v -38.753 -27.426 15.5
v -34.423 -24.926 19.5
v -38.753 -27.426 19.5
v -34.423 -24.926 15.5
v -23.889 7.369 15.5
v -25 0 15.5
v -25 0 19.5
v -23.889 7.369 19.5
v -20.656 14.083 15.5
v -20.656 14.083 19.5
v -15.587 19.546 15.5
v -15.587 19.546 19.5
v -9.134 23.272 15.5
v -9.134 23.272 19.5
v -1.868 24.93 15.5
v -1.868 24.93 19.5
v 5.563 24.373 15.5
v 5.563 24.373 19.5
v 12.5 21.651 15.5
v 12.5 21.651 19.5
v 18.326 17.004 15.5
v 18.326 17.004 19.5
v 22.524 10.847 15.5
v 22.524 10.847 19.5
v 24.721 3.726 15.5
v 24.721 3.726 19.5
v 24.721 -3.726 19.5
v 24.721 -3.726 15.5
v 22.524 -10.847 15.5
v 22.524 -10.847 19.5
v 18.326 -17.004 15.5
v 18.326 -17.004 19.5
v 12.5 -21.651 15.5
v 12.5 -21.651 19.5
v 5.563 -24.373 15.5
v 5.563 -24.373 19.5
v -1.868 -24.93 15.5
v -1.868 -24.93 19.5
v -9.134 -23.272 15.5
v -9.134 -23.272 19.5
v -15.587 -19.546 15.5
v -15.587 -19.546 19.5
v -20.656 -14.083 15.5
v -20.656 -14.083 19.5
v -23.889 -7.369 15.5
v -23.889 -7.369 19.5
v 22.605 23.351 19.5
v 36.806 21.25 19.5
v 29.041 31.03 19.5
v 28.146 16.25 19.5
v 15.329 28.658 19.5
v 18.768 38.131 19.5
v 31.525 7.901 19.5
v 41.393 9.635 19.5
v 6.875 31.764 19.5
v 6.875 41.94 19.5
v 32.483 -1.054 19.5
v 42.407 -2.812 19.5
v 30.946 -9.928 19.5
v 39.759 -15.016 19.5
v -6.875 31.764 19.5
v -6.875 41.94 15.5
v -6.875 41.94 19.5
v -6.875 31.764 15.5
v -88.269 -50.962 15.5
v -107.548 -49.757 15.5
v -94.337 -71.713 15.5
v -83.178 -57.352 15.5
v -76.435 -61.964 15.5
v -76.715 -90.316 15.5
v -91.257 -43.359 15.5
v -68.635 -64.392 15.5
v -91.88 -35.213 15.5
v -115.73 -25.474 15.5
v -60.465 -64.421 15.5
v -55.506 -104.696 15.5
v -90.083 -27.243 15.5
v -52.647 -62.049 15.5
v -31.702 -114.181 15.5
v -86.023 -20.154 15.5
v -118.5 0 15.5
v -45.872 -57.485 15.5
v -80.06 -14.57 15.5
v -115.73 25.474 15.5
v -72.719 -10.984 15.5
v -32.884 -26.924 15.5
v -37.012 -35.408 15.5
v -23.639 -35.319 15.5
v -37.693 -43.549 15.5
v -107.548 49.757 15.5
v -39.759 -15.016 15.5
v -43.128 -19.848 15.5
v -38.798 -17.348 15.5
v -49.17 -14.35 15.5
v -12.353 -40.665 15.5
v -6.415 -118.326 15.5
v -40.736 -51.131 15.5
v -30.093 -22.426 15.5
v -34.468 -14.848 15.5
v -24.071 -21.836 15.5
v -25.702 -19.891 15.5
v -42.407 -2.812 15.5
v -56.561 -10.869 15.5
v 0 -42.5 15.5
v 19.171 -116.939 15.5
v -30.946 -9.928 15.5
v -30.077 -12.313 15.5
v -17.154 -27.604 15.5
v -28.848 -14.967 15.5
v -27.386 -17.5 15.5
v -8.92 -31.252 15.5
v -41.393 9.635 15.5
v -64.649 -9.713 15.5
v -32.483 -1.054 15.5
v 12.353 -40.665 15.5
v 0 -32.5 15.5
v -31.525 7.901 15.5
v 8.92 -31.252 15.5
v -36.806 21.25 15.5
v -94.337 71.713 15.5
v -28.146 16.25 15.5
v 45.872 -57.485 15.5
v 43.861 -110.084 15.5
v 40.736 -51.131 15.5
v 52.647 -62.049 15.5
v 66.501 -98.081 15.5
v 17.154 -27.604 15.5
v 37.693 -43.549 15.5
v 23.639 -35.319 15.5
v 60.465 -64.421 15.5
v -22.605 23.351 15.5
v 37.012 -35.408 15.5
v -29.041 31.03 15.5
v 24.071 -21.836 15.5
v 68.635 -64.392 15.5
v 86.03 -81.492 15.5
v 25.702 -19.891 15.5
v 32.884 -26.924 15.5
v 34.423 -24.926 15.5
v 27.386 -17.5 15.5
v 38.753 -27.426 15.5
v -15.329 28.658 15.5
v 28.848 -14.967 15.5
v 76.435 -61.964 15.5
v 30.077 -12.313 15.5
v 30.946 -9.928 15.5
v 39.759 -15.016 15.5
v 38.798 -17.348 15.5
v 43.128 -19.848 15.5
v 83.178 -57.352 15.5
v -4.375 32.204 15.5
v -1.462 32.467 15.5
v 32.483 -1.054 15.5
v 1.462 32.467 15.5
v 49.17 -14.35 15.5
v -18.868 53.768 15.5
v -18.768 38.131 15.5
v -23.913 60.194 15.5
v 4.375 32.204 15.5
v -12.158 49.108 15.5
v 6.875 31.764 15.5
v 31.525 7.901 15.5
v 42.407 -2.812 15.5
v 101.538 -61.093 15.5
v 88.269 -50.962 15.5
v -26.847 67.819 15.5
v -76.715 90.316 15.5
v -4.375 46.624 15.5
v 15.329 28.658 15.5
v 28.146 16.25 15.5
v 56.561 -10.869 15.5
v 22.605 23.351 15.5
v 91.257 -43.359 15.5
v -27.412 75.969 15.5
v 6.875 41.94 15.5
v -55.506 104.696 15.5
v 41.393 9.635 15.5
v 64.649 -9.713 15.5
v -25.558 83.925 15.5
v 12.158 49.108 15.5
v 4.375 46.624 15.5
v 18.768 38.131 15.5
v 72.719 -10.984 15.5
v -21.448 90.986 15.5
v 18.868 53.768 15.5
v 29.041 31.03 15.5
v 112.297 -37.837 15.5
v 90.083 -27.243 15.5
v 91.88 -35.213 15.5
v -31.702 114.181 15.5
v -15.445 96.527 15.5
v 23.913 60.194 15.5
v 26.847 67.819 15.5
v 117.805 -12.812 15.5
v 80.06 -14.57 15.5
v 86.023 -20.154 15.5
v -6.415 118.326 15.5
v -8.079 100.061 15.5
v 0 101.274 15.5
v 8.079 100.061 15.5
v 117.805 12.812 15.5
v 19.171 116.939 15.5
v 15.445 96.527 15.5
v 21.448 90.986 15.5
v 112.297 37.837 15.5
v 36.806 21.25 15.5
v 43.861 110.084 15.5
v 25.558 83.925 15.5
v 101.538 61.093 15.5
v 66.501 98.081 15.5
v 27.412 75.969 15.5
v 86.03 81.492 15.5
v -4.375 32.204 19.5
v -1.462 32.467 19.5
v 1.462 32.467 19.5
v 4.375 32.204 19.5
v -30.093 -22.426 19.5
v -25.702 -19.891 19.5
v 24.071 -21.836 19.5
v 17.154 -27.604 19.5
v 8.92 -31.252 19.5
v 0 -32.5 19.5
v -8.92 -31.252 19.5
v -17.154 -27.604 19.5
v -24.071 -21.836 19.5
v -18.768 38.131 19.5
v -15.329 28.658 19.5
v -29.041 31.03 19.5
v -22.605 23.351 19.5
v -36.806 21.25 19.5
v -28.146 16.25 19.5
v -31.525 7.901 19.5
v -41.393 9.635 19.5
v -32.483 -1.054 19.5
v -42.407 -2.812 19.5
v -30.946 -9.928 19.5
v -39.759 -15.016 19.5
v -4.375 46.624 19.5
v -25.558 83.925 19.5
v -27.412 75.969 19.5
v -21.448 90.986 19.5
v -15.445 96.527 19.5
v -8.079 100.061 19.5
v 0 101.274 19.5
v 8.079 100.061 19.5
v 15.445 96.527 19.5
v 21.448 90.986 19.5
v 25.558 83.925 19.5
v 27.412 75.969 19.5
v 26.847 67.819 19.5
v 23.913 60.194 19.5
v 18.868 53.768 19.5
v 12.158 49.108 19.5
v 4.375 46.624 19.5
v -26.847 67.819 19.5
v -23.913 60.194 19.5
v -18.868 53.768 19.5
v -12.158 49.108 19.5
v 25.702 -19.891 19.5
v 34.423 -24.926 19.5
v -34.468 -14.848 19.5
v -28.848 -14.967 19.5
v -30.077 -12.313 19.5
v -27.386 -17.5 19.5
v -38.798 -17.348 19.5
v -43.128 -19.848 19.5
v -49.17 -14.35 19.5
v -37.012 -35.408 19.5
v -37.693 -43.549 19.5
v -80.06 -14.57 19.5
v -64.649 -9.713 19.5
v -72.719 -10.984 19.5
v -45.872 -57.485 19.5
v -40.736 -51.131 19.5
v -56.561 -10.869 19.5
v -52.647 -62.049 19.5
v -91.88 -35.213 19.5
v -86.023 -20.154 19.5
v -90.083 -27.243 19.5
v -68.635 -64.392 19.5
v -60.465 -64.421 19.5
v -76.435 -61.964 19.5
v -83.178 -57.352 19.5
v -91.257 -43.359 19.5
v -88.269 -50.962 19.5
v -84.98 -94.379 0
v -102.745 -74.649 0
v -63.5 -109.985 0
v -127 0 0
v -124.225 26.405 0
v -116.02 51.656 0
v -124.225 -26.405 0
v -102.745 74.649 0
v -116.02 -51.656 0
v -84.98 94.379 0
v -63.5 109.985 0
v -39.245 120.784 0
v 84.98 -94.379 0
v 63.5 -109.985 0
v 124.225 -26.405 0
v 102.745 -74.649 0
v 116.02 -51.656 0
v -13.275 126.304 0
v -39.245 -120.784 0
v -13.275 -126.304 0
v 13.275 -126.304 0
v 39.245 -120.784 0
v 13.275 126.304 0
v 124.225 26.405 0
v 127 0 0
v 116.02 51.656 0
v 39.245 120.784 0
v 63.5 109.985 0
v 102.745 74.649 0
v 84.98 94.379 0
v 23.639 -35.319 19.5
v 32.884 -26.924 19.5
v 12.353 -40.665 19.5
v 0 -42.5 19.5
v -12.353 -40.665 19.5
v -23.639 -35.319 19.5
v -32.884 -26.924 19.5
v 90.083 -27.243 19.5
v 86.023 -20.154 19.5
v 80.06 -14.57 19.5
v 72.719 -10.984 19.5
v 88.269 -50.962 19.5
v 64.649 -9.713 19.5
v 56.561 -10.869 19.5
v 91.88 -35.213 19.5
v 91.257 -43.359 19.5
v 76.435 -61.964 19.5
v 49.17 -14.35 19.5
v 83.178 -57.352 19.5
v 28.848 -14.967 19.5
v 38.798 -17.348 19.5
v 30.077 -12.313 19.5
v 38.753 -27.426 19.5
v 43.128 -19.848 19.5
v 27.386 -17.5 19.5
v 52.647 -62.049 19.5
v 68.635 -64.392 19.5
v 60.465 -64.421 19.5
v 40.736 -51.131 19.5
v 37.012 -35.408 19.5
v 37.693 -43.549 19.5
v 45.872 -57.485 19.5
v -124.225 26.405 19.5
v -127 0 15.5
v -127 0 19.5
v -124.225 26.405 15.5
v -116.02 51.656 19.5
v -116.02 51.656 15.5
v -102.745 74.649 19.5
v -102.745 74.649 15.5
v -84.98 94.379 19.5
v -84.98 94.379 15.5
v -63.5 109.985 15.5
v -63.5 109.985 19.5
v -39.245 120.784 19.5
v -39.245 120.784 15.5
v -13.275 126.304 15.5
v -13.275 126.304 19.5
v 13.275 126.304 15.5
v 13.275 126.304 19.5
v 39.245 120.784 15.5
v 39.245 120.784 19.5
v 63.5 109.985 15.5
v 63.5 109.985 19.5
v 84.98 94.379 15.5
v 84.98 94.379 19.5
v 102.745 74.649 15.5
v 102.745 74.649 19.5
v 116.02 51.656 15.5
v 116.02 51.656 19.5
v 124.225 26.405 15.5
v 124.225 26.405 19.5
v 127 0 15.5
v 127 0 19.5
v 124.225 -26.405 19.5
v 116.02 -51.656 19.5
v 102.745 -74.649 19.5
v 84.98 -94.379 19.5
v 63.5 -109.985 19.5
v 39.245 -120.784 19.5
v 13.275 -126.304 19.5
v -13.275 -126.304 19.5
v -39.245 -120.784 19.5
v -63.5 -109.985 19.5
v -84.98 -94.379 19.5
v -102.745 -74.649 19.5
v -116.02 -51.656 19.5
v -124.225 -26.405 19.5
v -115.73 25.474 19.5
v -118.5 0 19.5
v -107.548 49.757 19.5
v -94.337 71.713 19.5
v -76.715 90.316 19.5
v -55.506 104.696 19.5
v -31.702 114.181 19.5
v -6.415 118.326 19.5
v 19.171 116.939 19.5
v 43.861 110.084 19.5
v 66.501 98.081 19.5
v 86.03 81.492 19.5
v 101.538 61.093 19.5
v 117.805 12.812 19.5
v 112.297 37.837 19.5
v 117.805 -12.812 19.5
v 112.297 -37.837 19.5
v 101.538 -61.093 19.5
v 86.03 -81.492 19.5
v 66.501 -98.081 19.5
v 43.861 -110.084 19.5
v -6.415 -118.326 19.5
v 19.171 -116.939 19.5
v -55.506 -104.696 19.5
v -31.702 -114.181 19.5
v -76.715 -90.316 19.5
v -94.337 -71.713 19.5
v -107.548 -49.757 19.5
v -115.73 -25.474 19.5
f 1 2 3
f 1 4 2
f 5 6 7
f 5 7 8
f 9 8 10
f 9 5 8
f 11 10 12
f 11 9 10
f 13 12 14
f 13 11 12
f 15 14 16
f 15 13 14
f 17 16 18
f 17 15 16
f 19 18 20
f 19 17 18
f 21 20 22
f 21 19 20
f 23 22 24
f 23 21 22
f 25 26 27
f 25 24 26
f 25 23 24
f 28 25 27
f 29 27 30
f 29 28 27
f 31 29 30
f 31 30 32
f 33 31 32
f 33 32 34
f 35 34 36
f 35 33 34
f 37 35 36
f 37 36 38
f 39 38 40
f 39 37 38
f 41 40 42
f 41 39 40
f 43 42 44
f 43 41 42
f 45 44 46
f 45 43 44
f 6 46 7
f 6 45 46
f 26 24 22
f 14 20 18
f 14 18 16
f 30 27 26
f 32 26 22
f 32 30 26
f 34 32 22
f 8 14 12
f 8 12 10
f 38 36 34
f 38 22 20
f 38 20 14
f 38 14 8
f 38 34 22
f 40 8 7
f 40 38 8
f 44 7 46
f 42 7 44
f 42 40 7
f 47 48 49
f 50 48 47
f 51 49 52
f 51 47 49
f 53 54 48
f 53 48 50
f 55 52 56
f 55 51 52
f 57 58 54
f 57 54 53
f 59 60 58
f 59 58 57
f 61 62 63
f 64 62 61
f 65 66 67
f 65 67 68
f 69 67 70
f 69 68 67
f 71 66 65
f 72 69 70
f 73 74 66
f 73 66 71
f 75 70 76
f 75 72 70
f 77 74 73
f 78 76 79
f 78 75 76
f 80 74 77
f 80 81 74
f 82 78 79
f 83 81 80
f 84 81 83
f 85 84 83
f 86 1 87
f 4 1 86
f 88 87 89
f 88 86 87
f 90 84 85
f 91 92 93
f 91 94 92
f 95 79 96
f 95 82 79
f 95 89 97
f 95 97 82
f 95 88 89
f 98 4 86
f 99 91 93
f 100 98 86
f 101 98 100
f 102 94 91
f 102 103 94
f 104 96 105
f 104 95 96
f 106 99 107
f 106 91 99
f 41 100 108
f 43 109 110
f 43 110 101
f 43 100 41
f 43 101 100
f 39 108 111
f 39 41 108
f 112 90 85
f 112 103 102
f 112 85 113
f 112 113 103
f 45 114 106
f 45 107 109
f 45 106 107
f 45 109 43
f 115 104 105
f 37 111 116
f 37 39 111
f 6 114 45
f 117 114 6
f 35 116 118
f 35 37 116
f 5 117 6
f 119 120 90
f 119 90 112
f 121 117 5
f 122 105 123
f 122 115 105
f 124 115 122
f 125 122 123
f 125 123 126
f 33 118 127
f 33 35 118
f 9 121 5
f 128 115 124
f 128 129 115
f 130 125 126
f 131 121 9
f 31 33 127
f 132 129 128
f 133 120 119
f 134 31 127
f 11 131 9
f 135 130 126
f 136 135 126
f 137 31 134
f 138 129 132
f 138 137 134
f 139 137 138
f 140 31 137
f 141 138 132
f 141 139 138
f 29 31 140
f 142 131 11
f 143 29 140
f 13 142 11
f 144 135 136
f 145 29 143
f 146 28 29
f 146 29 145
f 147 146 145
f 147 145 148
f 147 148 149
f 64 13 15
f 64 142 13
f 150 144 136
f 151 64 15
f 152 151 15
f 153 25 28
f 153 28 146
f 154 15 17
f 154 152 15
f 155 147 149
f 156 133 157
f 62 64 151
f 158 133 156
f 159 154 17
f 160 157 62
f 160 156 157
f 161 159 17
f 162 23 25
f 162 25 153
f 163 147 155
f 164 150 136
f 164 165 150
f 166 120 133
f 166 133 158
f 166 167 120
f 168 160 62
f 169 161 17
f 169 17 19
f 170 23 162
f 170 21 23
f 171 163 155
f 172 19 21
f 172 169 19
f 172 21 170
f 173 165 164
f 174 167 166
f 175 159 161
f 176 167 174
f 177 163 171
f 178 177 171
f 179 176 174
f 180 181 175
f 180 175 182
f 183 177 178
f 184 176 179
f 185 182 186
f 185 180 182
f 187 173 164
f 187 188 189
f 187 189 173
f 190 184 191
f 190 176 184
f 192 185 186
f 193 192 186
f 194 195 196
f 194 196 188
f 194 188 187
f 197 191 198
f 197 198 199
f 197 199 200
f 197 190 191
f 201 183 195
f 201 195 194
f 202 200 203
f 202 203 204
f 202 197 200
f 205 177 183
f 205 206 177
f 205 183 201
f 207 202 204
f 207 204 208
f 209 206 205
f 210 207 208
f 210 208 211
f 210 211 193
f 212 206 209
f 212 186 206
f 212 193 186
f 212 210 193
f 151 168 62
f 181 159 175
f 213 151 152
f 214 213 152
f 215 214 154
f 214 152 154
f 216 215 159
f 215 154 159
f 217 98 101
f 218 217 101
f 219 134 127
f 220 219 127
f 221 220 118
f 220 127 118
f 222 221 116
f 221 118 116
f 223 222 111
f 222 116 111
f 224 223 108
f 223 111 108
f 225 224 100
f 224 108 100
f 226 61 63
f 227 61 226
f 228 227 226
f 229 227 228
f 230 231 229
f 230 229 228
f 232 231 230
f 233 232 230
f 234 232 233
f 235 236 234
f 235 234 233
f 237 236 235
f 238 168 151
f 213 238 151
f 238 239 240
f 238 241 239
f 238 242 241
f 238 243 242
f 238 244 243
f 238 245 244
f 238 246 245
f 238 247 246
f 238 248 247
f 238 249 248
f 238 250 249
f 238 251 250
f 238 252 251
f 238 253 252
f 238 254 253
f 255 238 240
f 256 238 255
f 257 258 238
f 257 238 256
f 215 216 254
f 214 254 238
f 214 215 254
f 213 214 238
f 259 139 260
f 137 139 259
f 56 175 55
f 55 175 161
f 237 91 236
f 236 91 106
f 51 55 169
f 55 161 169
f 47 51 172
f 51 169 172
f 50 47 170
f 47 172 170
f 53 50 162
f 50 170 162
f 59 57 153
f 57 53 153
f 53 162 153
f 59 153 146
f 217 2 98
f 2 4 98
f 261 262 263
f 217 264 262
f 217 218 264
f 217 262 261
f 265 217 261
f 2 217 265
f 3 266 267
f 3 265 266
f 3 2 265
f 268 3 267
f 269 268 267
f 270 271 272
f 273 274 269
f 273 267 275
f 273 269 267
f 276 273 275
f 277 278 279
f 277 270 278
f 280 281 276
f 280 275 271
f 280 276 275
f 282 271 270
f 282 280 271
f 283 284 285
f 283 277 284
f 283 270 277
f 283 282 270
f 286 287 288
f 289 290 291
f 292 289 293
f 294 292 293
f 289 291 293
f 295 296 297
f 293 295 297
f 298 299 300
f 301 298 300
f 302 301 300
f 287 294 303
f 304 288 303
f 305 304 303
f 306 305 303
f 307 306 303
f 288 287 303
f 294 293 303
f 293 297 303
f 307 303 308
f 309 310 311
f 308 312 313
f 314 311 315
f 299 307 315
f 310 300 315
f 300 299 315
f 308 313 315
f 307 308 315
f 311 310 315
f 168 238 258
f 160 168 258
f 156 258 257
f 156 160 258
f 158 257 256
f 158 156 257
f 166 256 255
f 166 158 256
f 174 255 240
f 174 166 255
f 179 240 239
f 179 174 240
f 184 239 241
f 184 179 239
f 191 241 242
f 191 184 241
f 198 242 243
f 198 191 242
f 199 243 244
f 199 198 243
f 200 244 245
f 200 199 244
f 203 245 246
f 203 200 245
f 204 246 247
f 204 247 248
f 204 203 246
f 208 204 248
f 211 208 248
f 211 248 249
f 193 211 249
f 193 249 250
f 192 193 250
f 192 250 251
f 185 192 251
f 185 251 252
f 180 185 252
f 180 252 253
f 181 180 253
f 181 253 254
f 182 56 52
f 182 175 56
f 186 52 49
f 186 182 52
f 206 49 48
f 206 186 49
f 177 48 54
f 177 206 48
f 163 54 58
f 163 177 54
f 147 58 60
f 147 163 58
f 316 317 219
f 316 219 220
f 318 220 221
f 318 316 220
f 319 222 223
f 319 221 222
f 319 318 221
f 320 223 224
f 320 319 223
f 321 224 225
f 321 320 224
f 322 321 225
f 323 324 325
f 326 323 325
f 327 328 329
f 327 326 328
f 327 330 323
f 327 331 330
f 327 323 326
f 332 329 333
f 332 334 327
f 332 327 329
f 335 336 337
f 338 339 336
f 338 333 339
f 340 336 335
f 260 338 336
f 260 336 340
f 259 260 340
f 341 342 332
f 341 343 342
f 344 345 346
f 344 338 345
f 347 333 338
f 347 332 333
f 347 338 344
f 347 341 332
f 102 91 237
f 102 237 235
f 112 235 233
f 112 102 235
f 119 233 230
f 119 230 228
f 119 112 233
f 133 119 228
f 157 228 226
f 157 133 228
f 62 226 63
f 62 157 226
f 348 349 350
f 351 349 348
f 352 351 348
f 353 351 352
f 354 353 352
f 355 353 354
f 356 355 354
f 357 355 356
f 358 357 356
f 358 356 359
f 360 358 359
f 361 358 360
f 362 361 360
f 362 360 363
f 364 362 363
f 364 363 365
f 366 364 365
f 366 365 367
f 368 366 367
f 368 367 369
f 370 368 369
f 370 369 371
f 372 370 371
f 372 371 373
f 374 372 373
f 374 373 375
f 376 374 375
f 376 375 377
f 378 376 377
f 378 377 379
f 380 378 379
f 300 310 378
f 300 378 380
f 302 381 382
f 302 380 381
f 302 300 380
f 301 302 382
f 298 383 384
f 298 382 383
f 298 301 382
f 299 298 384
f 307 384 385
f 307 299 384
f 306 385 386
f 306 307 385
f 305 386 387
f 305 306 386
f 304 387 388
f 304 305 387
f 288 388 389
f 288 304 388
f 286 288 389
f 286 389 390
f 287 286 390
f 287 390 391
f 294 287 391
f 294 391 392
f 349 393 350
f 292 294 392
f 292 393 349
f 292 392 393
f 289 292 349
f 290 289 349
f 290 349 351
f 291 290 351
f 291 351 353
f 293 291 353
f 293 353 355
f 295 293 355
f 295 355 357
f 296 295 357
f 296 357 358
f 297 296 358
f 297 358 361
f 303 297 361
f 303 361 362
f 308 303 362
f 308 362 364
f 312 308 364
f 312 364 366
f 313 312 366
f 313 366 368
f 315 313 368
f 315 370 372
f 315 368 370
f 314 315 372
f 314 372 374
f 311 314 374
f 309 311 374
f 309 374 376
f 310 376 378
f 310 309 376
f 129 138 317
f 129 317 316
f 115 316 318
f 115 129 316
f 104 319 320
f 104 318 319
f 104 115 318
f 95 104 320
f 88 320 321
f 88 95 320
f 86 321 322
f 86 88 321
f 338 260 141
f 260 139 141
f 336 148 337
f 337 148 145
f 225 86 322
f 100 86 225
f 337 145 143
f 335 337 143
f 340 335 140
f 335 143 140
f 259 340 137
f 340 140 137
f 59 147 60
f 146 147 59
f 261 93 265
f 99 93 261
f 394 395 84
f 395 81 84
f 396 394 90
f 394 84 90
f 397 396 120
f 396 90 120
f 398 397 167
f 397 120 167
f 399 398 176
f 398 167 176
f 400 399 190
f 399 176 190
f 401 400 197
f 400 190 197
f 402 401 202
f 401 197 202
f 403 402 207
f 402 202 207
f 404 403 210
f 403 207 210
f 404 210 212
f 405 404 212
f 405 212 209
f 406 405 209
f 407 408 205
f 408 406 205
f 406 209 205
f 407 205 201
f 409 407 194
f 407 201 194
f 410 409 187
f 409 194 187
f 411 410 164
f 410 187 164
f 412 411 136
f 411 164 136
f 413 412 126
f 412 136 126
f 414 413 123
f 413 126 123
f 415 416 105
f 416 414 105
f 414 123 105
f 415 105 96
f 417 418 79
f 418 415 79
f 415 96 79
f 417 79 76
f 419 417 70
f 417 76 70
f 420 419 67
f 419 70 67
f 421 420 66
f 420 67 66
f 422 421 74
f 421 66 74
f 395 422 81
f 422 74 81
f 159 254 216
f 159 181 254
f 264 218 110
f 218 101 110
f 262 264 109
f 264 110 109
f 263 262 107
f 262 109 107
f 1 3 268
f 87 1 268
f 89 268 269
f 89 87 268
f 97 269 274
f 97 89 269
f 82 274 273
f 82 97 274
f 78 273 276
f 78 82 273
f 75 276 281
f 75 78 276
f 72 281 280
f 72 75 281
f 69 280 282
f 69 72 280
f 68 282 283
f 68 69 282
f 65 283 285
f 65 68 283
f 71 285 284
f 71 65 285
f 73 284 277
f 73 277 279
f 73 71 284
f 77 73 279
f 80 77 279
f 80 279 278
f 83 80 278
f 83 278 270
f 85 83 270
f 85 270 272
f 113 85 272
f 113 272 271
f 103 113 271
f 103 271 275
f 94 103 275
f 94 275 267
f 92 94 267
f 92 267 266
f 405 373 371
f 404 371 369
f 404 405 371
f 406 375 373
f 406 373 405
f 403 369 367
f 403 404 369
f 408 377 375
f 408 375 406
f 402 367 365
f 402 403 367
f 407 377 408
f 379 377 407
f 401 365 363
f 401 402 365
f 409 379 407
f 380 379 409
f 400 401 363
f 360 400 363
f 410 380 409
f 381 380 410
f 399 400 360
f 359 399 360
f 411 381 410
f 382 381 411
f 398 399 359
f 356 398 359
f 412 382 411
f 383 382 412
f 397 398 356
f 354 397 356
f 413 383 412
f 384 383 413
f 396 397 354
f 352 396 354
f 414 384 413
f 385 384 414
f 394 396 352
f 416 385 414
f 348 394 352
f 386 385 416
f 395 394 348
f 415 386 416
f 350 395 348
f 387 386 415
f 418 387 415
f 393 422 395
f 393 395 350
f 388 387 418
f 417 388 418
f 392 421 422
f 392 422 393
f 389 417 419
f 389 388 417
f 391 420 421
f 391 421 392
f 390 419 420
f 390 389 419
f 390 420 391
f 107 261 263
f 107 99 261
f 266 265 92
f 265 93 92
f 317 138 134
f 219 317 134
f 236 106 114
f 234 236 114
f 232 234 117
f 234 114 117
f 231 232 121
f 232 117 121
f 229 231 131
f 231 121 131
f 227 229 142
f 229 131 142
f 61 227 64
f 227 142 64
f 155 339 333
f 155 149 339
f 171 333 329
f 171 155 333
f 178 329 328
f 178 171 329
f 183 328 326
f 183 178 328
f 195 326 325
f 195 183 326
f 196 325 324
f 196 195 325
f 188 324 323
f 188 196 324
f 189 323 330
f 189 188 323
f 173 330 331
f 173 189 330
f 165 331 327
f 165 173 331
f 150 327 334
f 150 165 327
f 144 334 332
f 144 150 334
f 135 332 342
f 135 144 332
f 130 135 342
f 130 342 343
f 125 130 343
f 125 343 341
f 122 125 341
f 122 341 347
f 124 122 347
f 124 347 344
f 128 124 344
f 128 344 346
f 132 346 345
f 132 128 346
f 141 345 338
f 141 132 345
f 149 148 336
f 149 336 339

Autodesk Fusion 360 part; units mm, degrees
sketch "Sketch1" plane through (0, 0, 0) normal (0, 0, 1) x (1, 0, 0)
  circle A0 centre (0, 0) radius 127
  dimension "d1" = 254
extrude "Extrude1" add sketch "Sketch1" along normal blind 15.5
sketch "Sketch3" plane through (0, 0, 15.5) normal (0, 0, 1) x (-1, 0, 0)
  circle A0 centre (0, 0) radius 127
  circle A1 centre (0, 0) radius 25
  circle A2 centre (0, 0) radius 32.5
  circle A3 centre (0, 0) radius 42.5
  line L0 (4.375, -42.2742) -> (-4.375, -42.2742) construction
  line L1 (-4.375, -42.2742) -> (-4.375, -47.2742)
  line L2 (4.375, -42.2742) -> (4.375, -47.2742)
  line L3 (-4.375, -47.2742) -> (4.375, -47.2742) construction
  line L4 (0, -47.2742) -> (0, -73.7742) construction
  circle A4 centre (0, -73.7742) radius 27.5
  line L5 (-4.375, -42.2742) -> (-4.375, -32.2042)
  line L6 (4.375, -42.2742) -> (4.375, -32.2042)
  line L7 (-6.875, -41.9402) -> (-6.875, -31.7645)
  line L8 (-6.875, -41.9402) -> (6.875, -41.9402) construction
  line L9 (6.875, -41.9402) -> (6.875, -31.7645)
  line L10 (-34.423, 24.926) -> (-38.798, 17.3482) construction
  line L11 (-36.6105, 21.1371) -> (0, -42.2742) construction
  line L12 (34.423, 24.926) -> (38.798, 17.3482) construction
  line L13 (36.6105, 21.1371) -> (0, -42.2742) construction
  line L14 (-36.6105, 21.1371) -> (36.6105, 21.1371) construction
  line L15 (-38.798, 17.3482) -> (-30.0771, 12.3132)
  line L16 (-34.423, 24.926) -> (-25.7021, 19.891)
  line L17 (-34.423, 24.926) -> (-30.0929, 22.426)
  line L18 (-38.798, 17.3482) -> (-34.4679, 14.8482)
  circle A5 centre (-64.4531, 37.212) radius 27.5
  line L19 (-39.7588, 15.0162) -> (-32.8838, 26.924) construction
  line L20 (-39.7588, 15.0162) -> (-30.9464, 9.9283)
  line L21 (-32.8838, 26.924) -> (-24.0714, 21.8362)
  line L22 (34.423, 24.926) -> (30.0929, 22.426)
  line L23 (38.798, 17.3482) -> (34.4679, 14.8482)
  circle A6 centre (64.4531, 37.212) radius 27.5
  line L24 (34.423, 24.926) -> (25.7021, 19.891)
  line L25 (38.798, 17.3482) -> (30.0771, 12.3132)
  line L26 (32.8838, 26.924) -> (39.7588, 15.0162) construction
  line L27 (32.8838, 26.924) -> (24.0714, 21.8362)
  line L28 (39.7588, 15.0162) -> (30.9464, 9.9283)
  circle A7 centre (0, 0) radius 118.5
  line L29 (-38.798, 17.3482) -> (-43.1282, 19.8482)
  line L30 (-34.423, 24.926) -> (-38.7532, 27.426)
  line L31 (34.423, 24.926) -> (38.7532, 27.426)
  line L32 (38.798, 17.3482) -> (43.1282, 19.8482)
  line L33 (-43.1282, 19.8482) -> (-38.7532, 27.426) construction
  line L34 (38.7532, 27.426) -> (43.1282, 19.8482) construction
  dimension "d19" = 50
  dimension "d20" = 7.5
  dimension "d21" = 17.5
  dimension "d22" = 8.75
  dimension "d23" = 5
  dimension "d24" = 26.5
  dimension "d25" = 55
  dimension "d26" = 13.75
  dimension "d32" = 237
  dimension "d33" = 5
  dimension "d35" = 5
extrude "Extrude3" add sketch "Sketch3" along normal blind 4 contours A0 | A1 | A2 A3 L9 L28 | A2 A3 L22 L23 L24 L25 | A2 A3 L5 L6 | A3 A6 L31 L32 | A3 L1 L2 A4 | A2 A3 L21 L27 | A6 | A2 A3 L7 L20 | A4 | A2 A3 L15 L16 L17 L18 | A3 A5 L29 L30 | A5
